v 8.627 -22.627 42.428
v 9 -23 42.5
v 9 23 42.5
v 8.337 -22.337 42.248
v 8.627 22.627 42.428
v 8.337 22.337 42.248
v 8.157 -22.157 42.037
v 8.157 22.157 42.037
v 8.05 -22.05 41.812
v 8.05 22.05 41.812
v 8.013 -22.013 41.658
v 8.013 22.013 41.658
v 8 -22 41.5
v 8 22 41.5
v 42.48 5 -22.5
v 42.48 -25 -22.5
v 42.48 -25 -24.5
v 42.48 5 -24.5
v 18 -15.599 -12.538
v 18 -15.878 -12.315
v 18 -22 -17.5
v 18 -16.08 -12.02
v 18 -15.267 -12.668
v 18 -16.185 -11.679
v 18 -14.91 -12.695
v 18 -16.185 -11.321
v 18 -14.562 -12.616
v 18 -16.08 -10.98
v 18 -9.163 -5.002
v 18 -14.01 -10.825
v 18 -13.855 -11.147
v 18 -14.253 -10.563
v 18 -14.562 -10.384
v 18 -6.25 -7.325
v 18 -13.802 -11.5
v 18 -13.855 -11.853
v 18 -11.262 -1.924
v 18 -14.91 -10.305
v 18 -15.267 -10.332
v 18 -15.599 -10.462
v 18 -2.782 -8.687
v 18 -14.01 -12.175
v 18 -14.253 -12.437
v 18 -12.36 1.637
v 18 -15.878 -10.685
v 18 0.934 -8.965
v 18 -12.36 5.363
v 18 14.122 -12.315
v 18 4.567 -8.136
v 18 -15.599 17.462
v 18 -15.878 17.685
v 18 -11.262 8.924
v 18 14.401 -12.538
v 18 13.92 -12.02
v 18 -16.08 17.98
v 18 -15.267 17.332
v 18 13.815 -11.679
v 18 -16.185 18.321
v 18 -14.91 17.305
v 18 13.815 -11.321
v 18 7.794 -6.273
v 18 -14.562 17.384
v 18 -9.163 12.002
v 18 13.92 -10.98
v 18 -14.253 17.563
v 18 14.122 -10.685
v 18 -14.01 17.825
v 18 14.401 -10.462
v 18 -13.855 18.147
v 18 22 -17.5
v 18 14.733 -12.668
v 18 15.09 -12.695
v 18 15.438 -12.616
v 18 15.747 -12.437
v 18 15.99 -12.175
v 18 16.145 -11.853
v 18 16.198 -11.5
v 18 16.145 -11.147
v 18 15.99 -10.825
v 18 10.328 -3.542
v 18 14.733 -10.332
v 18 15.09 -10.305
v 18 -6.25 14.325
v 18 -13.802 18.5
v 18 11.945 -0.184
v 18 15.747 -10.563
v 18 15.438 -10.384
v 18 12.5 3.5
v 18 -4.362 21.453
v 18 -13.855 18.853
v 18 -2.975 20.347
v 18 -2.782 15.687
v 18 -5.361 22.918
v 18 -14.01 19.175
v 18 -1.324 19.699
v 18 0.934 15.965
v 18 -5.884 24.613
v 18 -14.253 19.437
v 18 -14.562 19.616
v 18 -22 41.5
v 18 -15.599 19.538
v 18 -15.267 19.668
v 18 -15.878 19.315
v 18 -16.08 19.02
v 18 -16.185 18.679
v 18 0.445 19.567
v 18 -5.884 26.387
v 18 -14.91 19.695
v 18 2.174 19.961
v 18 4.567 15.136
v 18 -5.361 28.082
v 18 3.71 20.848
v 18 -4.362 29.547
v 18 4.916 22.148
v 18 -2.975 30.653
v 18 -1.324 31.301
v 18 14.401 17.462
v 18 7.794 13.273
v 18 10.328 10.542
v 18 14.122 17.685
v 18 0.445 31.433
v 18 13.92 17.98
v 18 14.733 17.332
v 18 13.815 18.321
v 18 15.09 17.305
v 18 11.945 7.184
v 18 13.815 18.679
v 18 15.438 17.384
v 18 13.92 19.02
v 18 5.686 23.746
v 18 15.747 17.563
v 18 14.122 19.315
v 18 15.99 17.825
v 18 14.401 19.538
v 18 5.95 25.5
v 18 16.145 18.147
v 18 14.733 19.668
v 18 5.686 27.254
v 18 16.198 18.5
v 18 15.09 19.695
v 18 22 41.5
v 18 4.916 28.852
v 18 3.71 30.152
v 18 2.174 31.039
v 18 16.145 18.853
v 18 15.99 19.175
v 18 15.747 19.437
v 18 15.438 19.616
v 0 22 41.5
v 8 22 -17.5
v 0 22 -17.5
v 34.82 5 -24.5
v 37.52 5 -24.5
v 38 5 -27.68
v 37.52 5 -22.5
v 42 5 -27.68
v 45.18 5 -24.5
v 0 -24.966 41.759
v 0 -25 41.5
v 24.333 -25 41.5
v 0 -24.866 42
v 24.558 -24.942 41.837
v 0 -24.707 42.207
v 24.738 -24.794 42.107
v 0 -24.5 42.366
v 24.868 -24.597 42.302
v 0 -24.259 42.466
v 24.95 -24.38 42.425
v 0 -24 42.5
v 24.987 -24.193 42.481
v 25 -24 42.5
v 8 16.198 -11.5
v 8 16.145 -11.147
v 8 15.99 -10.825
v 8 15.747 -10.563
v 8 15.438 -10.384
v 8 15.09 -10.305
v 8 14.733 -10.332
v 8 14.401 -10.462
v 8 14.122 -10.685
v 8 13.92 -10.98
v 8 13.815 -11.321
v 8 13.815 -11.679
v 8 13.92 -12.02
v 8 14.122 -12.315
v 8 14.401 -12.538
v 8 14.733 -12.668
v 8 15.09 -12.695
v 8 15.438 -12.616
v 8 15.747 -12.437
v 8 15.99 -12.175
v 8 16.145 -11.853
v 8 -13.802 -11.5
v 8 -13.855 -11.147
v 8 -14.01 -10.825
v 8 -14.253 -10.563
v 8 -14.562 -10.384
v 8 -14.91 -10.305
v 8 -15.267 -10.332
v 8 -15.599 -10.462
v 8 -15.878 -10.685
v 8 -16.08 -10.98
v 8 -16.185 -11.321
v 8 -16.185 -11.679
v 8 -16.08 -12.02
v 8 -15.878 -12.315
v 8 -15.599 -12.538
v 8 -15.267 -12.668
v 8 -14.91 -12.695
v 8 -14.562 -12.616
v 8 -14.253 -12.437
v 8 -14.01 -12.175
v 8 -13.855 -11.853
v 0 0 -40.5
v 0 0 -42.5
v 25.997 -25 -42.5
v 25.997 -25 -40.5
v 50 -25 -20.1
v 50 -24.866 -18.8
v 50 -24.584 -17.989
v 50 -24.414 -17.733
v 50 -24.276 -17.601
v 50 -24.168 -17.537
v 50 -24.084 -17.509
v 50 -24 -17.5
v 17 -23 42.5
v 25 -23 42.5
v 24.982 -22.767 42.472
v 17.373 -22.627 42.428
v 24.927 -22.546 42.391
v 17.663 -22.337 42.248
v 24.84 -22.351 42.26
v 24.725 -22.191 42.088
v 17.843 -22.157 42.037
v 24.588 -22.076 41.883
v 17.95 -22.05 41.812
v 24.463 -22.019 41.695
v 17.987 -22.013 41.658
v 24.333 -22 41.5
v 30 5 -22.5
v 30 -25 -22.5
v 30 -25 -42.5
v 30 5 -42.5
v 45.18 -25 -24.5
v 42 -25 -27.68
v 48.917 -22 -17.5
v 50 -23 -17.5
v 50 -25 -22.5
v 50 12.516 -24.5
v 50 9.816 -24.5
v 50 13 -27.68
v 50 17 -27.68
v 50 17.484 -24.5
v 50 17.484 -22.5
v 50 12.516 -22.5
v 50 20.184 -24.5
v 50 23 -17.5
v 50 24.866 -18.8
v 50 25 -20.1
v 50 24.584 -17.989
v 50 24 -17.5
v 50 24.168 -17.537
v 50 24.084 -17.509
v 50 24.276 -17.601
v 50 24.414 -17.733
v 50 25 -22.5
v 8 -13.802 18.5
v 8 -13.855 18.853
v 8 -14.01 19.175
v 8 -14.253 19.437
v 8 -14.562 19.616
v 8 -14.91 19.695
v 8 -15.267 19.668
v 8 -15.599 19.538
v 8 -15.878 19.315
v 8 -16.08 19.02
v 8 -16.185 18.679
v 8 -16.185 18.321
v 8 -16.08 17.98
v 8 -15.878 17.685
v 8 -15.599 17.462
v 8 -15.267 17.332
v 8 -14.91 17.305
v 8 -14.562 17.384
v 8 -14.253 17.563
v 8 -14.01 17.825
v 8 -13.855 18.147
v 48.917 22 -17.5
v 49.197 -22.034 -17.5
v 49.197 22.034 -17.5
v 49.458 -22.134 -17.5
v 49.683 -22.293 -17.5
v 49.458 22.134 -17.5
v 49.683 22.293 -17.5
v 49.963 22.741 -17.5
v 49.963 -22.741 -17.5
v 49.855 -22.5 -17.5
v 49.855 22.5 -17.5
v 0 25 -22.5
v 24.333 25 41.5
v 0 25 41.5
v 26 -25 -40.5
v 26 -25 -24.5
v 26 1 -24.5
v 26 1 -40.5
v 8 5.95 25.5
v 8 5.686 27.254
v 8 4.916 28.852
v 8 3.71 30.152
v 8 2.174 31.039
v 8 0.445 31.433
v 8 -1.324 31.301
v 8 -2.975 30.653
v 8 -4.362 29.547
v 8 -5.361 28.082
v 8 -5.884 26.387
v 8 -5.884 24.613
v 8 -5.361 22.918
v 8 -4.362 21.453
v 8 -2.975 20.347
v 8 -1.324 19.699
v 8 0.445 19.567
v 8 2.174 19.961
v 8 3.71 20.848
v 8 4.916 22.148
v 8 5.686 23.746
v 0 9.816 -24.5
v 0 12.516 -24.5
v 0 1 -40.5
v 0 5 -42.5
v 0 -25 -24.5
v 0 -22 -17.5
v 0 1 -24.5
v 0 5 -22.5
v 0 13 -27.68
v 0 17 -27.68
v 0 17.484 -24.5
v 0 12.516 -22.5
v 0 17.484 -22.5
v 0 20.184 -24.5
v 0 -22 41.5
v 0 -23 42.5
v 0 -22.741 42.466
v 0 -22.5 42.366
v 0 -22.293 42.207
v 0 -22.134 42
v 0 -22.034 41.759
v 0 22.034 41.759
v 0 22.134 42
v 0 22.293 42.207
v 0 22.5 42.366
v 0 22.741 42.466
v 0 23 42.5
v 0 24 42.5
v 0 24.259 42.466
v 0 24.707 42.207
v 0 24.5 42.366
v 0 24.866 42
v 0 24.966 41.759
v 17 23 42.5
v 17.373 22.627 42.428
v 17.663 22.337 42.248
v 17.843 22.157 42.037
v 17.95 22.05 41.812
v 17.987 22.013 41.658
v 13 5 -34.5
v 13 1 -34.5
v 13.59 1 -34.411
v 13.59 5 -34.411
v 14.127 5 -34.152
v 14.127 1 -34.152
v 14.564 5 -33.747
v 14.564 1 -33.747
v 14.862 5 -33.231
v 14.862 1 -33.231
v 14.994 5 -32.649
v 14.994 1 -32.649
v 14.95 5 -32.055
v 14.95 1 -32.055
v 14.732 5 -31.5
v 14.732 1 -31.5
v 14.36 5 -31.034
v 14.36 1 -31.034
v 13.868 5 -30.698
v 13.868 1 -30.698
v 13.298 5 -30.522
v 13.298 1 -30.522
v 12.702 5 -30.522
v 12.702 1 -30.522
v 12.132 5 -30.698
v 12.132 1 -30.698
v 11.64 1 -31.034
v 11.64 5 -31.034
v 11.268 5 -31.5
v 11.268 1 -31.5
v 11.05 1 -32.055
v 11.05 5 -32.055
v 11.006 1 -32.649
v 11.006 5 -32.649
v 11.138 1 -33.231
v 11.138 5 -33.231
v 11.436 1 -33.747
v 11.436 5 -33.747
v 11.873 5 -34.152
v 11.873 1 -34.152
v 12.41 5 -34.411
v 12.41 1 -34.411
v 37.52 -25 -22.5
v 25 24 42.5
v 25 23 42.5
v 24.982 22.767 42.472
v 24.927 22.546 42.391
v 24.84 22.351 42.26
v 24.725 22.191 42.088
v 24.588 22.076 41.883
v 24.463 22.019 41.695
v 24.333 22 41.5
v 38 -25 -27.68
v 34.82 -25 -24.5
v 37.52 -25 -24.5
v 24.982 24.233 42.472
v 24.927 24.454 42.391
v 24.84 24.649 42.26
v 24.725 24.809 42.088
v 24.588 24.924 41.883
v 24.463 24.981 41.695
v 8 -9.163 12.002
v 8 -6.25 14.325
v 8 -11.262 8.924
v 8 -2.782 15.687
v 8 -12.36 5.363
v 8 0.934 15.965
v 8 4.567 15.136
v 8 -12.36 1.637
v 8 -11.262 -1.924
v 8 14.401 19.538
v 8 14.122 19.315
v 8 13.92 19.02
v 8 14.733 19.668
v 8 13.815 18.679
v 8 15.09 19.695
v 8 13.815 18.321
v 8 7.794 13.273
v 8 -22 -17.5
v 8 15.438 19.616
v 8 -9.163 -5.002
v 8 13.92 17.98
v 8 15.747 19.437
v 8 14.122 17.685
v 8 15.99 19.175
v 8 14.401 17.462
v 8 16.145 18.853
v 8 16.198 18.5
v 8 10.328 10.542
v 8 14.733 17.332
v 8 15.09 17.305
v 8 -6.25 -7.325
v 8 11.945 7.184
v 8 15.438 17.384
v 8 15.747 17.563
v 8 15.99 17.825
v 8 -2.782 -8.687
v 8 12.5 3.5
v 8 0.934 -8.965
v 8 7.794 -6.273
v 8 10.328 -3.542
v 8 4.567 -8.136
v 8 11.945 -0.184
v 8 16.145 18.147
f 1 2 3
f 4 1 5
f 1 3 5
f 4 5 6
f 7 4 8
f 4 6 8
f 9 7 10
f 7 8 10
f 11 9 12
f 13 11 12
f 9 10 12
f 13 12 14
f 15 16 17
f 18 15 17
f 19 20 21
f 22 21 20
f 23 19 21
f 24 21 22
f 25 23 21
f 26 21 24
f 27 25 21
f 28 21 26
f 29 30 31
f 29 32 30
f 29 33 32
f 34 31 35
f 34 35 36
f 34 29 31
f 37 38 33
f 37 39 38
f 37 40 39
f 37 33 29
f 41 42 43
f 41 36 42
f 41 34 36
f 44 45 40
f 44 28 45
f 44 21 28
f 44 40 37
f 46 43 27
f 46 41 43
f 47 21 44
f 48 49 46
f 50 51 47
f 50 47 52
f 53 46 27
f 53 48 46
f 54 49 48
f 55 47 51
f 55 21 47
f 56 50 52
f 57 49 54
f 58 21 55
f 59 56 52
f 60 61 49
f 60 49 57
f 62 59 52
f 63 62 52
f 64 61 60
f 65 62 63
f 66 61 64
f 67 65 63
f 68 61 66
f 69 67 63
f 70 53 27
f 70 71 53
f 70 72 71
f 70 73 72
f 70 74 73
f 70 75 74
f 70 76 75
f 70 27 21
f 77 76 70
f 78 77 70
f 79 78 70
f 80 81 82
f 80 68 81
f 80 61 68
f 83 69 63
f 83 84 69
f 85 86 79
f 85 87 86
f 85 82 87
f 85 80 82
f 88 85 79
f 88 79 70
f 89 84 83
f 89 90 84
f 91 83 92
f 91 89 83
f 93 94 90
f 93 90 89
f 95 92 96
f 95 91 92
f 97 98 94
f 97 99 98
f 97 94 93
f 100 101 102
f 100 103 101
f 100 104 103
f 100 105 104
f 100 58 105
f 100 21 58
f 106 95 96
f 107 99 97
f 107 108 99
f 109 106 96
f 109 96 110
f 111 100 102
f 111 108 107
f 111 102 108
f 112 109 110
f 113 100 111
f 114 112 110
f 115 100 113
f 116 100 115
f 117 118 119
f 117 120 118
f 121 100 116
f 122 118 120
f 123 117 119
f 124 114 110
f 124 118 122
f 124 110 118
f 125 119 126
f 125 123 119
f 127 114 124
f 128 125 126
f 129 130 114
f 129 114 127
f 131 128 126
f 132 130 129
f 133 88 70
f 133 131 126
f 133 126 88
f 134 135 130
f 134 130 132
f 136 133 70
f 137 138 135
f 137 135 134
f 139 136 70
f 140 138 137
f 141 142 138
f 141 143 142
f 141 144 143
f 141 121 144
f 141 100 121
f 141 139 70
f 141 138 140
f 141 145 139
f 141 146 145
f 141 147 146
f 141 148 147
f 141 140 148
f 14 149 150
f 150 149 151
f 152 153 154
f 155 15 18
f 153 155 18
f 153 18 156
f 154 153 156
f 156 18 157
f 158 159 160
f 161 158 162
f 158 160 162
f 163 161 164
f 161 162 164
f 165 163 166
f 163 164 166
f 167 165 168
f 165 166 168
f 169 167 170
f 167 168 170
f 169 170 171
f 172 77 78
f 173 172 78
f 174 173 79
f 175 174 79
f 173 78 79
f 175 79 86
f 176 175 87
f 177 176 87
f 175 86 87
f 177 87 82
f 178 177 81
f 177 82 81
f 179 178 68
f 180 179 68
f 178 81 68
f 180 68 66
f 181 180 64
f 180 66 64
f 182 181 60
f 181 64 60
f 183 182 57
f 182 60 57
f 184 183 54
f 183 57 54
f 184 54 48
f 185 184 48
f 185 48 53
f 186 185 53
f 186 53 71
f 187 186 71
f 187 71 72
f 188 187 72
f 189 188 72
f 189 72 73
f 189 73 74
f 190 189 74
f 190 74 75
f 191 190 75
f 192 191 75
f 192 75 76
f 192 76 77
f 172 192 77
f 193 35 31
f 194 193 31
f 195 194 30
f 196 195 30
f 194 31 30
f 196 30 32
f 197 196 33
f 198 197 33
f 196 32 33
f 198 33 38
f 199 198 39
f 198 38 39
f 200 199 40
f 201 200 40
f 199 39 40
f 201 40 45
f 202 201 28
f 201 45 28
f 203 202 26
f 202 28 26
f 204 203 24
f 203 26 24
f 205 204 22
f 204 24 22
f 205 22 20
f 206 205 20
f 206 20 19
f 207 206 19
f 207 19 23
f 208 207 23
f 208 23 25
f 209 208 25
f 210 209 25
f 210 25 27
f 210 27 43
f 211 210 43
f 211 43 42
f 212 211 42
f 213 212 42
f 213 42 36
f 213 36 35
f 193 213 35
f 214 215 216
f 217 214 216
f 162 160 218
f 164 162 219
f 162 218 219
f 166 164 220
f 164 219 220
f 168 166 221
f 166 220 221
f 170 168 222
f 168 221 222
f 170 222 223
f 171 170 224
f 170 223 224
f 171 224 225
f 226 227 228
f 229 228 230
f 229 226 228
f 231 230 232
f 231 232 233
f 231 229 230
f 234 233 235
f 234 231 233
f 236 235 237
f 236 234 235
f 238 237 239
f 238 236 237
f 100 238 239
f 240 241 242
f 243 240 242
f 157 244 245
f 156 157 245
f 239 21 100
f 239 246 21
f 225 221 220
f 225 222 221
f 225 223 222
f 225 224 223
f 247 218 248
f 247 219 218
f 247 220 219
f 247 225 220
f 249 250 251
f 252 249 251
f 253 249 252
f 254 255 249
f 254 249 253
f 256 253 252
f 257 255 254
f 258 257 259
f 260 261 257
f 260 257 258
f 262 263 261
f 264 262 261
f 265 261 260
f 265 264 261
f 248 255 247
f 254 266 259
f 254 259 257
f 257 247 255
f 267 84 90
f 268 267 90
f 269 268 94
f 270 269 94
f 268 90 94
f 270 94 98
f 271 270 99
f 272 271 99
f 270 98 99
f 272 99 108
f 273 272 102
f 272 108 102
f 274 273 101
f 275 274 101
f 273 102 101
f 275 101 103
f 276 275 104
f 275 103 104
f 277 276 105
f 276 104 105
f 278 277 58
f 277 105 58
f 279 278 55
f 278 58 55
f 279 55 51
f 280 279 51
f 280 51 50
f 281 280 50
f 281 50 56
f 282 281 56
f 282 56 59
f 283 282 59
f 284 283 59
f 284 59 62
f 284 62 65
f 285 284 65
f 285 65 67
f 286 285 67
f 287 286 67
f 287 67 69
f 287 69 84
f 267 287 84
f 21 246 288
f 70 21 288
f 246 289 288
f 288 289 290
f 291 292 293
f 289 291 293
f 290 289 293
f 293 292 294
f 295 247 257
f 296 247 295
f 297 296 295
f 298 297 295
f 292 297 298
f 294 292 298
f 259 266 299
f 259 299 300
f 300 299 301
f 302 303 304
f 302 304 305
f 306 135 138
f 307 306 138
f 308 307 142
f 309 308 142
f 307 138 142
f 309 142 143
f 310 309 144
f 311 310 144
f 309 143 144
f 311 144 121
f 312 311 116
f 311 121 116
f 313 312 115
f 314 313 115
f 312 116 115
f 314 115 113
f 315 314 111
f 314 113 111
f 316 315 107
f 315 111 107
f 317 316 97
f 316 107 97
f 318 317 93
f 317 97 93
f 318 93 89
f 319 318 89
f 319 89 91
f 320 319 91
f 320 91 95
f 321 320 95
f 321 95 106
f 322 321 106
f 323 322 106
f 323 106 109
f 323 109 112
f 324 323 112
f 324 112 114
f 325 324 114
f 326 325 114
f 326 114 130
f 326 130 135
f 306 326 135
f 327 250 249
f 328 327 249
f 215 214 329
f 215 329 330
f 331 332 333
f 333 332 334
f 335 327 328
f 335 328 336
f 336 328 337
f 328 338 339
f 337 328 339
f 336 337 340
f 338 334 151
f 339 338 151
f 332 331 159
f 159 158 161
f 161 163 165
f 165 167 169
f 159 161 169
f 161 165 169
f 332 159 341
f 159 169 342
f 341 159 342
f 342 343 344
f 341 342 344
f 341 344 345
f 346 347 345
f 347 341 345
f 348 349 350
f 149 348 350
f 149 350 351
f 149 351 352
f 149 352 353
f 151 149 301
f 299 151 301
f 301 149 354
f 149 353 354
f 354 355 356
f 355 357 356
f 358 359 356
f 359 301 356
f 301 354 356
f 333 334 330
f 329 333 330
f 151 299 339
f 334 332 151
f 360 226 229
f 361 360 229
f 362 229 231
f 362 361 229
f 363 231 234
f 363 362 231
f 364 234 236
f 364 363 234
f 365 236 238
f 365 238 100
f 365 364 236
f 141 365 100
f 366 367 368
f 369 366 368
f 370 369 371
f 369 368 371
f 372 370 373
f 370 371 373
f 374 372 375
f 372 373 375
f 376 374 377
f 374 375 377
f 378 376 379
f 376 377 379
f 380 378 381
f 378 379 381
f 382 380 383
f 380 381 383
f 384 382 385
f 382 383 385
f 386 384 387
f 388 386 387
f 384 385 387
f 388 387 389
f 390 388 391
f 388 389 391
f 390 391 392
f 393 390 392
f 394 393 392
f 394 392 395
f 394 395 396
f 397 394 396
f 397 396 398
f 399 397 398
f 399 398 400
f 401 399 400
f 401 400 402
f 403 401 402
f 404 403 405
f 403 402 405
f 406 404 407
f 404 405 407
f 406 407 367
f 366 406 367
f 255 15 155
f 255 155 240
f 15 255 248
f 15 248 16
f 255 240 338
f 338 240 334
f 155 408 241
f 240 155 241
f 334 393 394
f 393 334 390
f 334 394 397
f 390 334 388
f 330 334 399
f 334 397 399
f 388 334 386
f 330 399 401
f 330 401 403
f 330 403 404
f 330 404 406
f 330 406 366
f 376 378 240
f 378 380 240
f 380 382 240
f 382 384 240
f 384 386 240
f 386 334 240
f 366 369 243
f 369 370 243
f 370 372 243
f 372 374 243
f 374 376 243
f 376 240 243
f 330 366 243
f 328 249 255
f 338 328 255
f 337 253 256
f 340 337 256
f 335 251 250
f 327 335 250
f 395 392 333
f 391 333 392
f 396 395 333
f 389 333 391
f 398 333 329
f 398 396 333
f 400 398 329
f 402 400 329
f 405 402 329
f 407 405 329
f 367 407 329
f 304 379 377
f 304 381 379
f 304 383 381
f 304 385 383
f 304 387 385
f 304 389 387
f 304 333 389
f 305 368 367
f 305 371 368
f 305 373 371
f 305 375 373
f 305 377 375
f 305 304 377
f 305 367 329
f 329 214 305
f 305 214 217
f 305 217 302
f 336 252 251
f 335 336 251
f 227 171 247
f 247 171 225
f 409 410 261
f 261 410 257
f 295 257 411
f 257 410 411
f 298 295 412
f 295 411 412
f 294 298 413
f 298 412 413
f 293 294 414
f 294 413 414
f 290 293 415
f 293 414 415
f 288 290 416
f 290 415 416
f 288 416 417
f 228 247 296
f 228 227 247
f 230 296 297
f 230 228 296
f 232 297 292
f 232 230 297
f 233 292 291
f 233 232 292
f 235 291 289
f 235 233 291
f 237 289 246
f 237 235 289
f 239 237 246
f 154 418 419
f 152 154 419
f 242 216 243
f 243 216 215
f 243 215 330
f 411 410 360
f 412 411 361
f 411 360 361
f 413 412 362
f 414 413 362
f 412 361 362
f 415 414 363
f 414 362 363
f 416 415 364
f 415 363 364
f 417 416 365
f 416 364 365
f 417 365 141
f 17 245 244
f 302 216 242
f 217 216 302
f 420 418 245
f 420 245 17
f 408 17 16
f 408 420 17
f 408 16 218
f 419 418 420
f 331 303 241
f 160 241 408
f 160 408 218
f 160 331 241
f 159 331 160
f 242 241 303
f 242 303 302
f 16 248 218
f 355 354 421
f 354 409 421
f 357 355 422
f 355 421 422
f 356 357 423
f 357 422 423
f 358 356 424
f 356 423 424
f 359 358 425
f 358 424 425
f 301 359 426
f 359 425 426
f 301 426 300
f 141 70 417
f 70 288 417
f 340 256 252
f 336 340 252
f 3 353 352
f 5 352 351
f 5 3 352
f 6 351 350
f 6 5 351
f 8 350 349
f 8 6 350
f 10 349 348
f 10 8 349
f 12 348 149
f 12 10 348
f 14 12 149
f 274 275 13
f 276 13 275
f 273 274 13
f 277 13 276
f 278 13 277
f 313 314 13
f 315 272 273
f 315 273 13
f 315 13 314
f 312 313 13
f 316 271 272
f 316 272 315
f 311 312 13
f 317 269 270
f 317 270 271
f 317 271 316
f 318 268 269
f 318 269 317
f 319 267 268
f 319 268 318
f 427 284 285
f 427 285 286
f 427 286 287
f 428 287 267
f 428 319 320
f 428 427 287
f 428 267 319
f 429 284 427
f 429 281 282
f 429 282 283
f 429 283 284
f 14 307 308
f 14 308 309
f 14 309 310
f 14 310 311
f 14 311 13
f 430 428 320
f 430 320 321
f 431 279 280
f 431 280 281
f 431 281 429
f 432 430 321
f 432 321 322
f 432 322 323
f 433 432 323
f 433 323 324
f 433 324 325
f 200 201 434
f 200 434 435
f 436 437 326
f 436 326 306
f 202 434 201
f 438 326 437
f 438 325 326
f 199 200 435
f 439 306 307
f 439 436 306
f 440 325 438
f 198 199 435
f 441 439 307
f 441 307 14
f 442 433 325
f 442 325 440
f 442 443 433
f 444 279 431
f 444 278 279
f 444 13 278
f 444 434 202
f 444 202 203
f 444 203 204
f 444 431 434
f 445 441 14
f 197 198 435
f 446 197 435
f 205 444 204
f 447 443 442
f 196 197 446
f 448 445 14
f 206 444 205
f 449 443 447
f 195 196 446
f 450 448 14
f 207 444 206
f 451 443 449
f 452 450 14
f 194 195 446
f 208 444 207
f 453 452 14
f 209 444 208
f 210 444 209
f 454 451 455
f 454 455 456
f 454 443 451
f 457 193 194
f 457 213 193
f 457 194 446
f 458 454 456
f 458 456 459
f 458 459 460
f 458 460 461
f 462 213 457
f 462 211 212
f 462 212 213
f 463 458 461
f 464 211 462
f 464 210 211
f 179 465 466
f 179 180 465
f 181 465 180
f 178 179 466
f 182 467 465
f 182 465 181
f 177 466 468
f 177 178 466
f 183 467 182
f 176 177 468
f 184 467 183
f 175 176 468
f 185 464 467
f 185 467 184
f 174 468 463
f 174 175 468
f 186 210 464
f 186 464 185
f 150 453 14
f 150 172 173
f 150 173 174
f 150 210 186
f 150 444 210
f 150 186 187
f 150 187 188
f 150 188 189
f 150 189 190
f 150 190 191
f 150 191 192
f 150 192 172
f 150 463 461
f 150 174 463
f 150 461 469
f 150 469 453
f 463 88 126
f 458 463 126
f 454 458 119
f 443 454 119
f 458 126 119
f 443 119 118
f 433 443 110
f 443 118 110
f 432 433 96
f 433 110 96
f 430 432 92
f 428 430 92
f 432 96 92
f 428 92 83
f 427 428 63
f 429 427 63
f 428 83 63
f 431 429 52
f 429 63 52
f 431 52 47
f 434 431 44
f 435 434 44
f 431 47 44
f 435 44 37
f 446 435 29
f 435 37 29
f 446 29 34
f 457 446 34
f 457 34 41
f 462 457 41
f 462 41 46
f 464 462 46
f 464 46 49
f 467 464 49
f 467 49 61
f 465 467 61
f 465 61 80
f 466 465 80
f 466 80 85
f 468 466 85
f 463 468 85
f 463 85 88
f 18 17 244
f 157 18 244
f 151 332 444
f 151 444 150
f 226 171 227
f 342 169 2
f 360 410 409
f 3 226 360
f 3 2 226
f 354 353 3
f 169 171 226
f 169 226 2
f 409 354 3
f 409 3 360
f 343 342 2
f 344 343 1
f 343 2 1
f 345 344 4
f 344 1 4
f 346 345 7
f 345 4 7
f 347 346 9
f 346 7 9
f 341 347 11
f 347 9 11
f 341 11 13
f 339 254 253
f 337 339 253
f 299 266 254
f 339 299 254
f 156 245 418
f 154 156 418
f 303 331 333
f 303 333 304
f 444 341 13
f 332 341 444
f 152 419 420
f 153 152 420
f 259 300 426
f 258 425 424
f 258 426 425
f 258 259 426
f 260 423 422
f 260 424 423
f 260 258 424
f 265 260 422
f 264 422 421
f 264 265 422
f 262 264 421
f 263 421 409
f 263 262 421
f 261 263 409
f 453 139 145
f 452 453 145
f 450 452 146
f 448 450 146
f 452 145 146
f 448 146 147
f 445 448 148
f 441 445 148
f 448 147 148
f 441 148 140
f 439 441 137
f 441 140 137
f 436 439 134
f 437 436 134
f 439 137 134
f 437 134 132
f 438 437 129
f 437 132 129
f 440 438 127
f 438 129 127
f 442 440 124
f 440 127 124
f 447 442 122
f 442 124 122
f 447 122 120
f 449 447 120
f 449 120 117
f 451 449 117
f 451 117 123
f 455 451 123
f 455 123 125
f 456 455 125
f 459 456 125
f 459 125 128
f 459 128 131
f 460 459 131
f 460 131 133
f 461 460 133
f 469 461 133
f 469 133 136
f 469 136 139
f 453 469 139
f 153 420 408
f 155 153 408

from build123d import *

# Parameters (mm, degrees)
SKETCH_W        = 50
SKETCH_H        = 85
PAD_DEPTH       = 50
POCKET_DEPTH    = 50
POCKET001_DEPTH = 30
SKETCH004_W     = 16
SKETCH004_H     = 26
POCKET002_DEPTH = 26
SKETCH005_R     = 2
POCKET003_DEPTH = 4
POCKET005_DEPTH = 4
SKETCH008_W     = 44
SKETCH008_H     = 60
POCKET006_DEPTH = 32
SKETCH009_R     = 12.5
SKETCH009_R_2   = 5.95
SKETCH009_R_3   = 1.19841
POCKET007_DEPTH = 18.001
SKETCH010_W     = 44
SKETCH010_H     = 60
POCKET008_DEPTH = 8
POCKET009_DEPTH = 50.001
FILLET_R        = 1


with BuildPart() as part:
    # Sketch → Pad (new body)
    with BuildSketch(Plane.YZ):
        Rectangle(SKETCH_W, SKETCH_H)
    extrude(amount=PAD_DEPTH)

    # Sketch001 (on Face6 of Pad) → Pocket (cut)
    with BuildSketch(Plane.YZ.offset(50)):
        Polygon((5, -22.5), (5, -42.5), (25, -42.5), (25, -22.5), (17.48396, -22.5), (17.48396, -24.5), (20.18396, -24.5), (17, -27.68), (13, -27.68), (9.81604, -24.5), (12.51604, -24.5), (12.51604, -22.5), align=None)
    extrude(amount=-POCKET_DEPTH, mode=Mode.SUBTRACT)

    # Sketch003 (on Face2 of Pocket) → Pocket001 (cut)
    with BuildSketch(Plane(origin=(0, -25, 0), x_dir=(0, 0, -1), z_dir=(0, -1, 0))):
        Polygon((42.5, 50), (22.5, 50), (22.5, 42.48), (24.5, 42.48), (24.5, 45.18), (27.68, 42), (27.68, 38), (24.5, 34.82), (24.5, 37.52), (22.5, 37.52), (22.5, 30), (42.5, 30), align=None)
    extrude(amount=-POCKET001_DEPTH, mode=Mode.SUBTRACT)

    # Sketch004 (on Face2 of Pocket001) → Pocket002 (cut)
    with BuildSketch(Plane(origin=(0, -25, 0), x_dir=(0, 0, -1), z_dir=(0, -1, 0))):
        with Locations((32.5, 13)):
            Rectangle(SKETCH004_W, SKETCH004_H)
    extrude(amount=-POCKET002_DEPTH, mode=Mode.SUBTRACT)

    # Sketch005 (on Face30 of Pocket002) → Pocket003 (cut)
    with BuildSketch(Plane(origin=(0, 1, 0), x_dir=(0, 0, -1), z_dir=(0, -1, 0))):
        with Locations((32.5, 13)):
            Circle(SKETCH005_R)
    extrude(amount=-POCKET003_DEPTH, mode=Mode.SUBTRACT)

    # Sketch007 → Pocket005 (cut)
    with BuildSketch(Plane.YX.offset(42.5)):
        Polygon((-25.002718, 26), (-25, 0), (0, 0), align=None)
    extrude(amount=-POCKET005_DEPTH, mode=Mode.SUBTRACT)

    # Sketch008 (on Face5 of Pocket005) → Pocket006 (cut)
    with BuildSketch(Plane.YZ.offset(50)):
        with Locations((0, 12.5)):
            Rectangle(SKETCH008_W, SKETCH008_H)
    extrude(amount=-POCKET006_DEPTH, mode=Mode.SUBTRACT)

    # Sketch009 (on Face6 of Pocket006) → Pocket007 (cut, through all)
    with BuildSketch(Plane.YZ.offset(18)):
        with Locations((0, 3.5)):
            Circle(SKETCH009_R)
        with Locations((0, 25.5)):
            Circle(SKETCH009_R_2)
        with Locations((-15, 18.5)):
            Circle(SKETCH009_R_3)
        with Locations((-15, -11.5)):
            Circle(SKETCH009_R_3)
        with Locations((15, -11.5)):
            Circle(SKETCH009_R_3)
        with Locations((15, 18.5)):
            Circle(SKETCH009_R_3)
    extrude(amount=-POCKET007_DEPTH, mode=Mode.SUBTRACT)

    # Sketch010 (on Face2 of Pocket007) → Pocket008 (cut)
    with BuildSketch(Plane(origin=(0, 0, 0), x_dir=(0, 1, 0), z_dir=(-1, 0, 0))):
        with Locations((0, -12.5)):
            Rectangle(SKETCH010_W, SKETCH010_H)
    extrude(amount=-POCKET008_DEPTH, mode=Mode.SUBTRACT)

    # Sketch011 (on Face11 of Pocket008) → Pocket009 (cut, through all)
    with BuildSketch(Plane(origin=(0, -25, 0), x_dir=(0, 0, -1), z_dir=(0, -1, 0))):
        Polygon((-42.5, 50), (-42.5, 25), (17.5, 50), align=None)
    extrude(amount=-POCKET009_DEPTH, mode=Mode.SUBTRACT)

    # Fillet
    fillet_edges = [part.edges().sort_by_distance(p)[0] for p in [
        (8, 0, 42.5),
        (12.5, -25, 42.5),
        (4, -22, 42.5),
        (12.5, 25, 42.5),
        (37.5, 22, 12.5),
        (37.5, 25, 12.5),
        (18, 0, 42.5),
        (21.5, 22, 42.5),
        (21.5, -22, 42.5),
        (4, 22, 42.5),
        (37.5, -25, 12.5),
        (37.5, -22, 12.5),
    ]]
    fillet(fillet_edges, radius=FILLET_R)


solid = part.part
